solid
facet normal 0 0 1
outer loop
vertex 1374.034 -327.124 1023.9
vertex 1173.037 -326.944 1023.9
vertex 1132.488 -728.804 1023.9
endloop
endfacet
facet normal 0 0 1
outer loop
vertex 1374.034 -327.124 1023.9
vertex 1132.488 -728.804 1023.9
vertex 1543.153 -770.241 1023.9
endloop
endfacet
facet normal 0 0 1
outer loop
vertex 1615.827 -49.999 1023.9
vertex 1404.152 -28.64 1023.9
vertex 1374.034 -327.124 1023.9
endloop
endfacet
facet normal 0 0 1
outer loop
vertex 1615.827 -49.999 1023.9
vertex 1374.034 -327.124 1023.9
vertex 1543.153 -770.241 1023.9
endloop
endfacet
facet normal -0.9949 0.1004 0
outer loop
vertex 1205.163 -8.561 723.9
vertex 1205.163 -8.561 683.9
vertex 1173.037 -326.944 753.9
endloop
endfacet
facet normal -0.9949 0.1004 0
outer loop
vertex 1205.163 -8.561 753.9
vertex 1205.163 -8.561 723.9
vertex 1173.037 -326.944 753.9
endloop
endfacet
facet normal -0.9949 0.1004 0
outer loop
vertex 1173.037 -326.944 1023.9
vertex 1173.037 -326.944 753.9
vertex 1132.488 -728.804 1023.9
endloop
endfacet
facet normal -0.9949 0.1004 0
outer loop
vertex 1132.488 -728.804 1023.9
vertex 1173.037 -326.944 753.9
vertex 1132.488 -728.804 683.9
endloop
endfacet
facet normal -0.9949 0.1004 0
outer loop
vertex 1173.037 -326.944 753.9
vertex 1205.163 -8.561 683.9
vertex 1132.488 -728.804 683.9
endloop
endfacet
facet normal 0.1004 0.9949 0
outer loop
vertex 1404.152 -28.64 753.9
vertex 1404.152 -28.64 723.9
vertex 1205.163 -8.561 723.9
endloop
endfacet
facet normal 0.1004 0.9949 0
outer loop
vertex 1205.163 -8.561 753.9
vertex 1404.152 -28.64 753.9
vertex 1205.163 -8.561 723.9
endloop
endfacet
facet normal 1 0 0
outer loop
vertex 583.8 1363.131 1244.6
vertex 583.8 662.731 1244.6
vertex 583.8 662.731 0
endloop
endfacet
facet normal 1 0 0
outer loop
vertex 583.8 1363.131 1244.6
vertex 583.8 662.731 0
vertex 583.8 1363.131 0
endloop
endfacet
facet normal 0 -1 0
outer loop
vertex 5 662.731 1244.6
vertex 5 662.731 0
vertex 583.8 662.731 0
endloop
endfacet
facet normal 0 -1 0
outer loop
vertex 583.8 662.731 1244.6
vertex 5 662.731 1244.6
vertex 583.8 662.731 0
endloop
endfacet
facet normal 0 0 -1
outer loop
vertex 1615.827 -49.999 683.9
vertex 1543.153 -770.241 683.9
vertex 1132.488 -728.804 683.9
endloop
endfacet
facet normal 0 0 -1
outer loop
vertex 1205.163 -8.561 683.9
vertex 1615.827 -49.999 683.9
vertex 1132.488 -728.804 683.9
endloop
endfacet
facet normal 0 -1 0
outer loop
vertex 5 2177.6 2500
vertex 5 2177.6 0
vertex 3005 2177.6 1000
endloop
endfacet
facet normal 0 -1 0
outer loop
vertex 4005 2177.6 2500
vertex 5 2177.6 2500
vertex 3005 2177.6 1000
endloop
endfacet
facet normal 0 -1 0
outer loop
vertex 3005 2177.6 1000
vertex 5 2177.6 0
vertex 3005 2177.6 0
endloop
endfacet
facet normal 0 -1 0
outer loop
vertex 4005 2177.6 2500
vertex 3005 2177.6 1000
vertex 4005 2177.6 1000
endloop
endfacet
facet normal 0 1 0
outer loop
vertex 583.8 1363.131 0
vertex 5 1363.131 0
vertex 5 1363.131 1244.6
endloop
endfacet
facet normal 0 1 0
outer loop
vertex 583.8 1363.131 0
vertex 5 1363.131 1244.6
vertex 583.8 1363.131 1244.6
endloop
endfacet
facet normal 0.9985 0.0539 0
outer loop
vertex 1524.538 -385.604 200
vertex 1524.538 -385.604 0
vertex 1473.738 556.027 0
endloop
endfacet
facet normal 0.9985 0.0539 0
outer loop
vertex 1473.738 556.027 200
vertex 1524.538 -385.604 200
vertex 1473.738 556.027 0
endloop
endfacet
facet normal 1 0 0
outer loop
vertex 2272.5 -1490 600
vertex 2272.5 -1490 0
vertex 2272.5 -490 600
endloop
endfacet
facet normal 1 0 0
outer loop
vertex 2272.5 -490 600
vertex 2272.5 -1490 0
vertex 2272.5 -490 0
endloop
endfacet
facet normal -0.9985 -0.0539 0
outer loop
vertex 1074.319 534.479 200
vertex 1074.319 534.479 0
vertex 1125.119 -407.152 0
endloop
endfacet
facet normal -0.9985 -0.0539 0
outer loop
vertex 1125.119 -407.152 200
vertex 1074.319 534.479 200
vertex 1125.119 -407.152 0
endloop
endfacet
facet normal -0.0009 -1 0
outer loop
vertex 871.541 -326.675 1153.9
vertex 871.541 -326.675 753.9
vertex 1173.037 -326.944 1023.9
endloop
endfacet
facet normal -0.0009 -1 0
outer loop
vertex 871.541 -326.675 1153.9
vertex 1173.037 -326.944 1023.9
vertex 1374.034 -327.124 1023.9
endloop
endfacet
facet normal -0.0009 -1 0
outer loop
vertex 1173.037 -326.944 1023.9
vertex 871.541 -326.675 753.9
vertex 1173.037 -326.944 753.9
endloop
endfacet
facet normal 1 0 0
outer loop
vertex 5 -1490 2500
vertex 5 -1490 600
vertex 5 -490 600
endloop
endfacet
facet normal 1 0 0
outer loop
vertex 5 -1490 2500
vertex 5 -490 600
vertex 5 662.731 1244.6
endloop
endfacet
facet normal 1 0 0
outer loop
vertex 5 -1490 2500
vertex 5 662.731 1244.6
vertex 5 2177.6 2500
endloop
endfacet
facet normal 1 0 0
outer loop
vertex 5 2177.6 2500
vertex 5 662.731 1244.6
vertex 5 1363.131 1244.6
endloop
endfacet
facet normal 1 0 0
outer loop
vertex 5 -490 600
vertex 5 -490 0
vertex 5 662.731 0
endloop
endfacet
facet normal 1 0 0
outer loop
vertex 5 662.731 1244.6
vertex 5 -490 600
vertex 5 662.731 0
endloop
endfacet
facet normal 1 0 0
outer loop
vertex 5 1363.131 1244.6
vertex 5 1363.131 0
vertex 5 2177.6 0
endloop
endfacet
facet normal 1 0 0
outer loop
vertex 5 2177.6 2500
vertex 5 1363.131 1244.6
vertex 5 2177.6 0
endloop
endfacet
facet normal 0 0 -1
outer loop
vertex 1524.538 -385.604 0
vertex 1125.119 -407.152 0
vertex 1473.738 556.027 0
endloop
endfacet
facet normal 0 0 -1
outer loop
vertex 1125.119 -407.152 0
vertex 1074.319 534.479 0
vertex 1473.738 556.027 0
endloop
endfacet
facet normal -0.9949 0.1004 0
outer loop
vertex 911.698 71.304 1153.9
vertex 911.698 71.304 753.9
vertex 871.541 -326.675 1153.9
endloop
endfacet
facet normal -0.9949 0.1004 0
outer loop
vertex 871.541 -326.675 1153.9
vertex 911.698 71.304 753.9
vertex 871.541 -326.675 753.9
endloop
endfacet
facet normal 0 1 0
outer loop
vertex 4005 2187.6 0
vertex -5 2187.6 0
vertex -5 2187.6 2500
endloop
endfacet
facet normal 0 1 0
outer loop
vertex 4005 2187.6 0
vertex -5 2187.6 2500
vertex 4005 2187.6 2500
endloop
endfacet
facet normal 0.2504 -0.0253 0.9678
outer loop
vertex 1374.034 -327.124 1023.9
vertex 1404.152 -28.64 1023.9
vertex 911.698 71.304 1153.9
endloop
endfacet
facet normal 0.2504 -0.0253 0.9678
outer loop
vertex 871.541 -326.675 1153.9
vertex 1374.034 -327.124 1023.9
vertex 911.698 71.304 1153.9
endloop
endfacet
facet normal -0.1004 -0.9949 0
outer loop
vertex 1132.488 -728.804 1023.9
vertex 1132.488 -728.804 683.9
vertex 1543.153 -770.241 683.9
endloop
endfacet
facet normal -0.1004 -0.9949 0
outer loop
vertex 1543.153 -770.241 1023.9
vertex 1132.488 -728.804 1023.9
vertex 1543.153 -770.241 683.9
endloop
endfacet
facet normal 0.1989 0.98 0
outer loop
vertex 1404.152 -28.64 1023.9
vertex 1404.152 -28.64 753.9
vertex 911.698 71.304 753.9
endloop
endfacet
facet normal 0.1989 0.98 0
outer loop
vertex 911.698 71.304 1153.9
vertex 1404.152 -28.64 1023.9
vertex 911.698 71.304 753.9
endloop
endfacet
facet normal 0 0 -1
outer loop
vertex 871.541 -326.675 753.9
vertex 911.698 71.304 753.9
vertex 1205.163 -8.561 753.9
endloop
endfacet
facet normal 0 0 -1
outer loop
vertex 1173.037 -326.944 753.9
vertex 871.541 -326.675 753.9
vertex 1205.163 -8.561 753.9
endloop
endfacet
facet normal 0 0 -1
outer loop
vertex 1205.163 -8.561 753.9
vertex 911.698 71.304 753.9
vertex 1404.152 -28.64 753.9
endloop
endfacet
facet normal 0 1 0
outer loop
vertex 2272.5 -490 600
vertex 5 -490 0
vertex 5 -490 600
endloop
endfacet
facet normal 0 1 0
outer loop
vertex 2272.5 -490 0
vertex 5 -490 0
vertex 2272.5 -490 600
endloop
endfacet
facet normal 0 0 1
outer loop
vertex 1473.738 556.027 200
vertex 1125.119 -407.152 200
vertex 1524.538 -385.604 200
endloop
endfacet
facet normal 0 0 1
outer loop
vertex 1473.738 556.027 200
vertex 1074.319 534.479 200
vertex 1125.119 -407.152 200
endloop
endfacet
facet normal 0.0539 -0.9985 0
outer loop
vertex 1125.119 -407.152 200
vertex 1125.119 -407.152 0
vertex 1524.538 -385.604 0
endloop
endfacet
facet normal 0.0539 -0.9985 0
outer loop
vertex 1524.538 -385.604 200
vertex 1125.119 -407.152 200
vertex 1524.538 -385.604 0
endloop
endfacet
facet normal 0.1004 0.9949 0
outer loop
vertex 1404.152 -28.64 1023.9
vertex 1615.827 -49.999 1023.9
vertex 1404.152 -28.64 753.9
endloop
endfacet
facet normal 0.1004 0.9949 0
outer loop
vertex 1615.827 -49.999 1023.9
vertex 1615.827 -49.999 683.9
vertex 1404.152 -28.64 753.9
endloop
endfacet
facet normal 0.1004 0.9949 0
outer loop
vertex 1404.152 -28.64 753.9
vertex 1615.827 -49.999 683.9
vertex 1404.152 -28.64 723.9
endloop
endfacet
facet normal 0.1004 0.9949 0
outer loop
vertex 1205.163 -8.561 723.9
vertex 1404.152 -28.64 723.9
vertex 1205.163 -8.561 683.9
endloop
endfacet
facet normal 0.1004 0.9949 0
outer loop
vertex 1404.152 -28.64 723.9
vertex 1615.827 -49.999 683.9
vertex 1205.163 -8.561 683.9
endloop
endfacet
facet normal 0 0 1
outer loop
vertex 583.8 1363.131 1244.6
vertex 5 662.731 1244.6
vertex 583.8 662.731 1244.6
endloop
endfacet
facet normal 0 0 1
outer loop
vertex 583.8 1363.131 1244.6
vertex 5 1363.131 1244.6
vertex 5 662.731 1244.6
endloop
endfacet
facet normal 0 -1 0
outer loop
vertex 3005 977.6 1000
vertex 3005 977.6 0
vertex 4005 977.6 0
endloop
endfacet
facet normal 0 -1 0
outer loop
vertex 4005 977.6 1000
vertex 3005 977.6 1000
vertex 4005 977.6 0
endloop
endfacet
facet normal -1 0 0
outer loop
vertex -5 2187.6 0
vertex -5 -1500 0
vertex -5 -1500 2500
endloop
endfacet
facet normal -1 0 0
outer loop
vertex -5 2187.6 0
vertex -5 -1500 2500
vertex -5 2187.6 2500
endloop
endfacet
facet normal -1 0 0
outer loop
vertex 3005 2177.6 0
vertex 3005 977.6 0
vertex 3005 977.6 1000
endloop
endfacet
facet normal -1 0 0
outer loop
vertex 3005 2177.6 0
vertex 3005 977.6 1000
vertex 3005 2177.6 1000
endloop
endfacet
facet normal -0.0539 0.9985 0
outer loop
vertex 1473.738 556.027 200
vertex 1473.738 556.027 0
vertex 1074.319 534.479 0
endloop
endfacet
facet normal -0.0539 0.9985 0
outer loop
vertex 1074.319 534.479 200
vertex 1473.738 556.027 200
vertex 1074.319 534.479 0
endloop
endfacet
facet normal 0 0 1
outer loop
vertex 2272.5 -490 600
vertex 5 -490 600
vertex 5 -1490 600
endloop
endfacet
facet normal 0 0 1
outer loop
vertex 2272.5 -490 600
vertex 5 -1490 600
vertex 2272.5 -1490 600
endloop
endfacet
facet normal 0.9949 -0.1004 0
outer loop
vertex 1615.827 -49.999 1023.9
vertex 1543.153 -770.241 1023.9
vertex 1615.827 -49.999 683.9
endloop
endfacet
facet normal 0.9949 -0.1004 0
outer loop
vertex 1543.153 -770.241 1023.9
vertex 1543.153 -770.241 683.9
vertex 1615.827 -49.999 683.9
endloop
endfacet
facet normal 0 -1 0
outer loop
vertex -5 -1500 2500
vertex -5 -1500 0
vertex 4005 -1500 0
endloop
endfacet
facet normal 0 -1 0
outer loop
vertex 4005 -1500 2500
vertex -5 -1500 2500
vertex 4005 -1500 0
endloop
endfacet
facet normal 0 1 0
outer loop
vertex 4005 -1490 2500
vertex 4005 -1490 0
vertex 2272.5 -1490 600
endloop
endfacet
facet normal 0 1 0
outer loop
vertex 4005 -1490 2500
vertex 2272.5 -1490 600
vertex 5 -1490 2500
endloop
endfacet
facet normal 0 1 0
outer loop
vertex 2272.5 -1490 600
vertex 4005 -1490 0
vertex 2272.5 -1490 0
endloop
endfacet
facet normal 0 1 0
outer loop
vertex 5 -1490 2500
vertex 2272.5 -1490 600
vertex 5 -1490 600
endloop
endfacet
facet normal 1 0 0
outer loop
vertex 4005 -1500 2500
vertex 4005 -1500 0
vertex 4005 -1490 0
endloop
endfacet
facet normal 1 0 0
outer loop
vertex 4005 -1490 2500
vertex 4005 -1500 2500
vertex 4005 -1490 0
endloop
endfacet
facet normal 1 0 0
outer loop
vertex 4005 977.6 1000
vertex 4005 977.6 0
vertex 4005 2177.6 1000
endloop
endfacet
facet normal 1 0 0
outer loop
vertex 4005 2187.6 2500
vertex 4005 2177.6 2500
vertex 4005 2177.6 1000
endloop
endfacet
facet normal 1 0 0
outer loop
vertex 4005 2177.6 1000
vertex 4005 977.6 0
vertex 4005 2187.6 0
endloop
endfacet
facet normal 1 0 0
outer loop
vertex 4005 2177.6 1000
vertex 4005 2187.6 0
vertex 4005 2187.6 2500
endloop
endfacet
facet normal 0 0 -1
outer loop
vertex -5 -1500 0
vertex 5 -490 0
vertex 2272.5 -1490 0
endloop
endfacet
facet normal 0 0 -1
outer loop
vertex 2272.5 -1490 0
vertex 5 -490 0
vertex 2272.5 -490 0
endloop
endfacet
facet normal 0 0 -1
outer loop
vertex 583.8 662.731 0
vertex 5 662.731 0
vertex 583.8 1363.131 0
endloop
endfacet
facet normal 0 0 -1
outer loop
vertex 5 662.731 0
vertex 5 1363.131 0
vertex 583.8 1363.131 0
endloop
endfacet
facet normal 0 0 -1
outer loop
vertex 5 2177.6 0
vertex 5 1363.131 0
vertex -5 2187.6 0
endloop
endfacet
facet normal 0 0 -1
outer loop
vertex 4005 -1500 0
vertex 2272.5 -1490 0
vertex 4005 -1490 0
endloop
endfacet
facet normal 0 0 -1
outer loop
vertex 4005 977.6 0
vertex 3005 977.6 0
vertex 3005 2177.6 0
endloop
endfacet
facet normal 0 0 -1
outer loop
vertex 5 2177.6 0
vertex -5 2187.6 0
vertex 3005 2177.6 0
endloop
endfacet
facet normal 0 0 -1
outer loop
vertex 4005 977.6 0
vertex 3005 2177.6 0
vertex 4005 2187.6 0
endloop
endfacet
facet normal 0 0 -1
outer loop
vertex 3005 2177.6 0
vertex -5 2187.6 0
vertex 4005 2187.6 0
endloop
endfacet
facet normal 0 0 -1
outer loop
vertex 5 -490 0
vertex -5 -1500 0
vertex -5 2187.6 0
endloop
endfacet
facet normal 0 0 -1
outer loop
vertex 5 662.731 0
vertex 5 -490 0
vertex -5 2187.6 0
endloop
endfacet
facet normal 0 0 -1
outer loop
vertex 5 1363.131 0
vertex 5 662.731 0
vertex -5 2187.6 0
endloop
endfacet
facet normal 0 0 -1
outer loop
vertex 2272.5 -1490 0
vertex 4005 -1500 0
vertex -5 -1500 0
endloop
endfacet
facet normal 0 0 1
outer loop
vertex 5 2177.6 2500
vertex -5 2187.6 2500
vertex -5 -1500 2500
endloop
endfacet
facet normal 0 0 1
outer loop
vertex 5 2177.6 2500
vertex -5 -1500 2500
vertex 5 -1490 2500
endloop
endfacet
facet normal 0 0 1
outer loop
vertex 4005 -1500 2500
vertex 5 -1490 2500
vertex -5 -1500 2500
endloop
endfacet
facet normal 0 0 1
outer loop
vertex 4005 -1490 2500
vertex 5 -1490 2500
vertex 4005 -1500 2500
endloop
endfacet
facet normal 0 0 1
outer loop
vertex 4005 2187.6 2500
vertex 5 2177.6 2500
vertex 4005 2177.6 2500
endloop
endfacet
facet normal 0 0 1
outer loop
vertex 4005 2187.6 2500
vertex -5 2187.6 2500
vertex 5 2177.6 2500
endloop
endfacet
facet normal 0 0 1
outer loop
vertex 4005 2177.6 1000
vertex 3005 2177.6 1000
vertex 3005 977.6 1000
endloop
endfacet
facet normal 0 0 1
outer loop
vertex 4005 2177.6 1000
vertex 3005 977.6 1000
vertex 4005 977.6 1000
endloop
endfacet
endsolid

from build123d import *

# Parameters (mm, degrees)
SKETCH1_W            = 10
SKETCH1_H            = 3687.6
BOSS_EXTRUDE1_DEPTH  = 2500
BOSS_EXTRUDE2_DEPTH  = 2500
SKETCH3_3_W          = 2267.5
SKETCH3_3_H          = 1000
BOSS_EXTRUDE3_DEPTH  = 600
SKETCH3_4_W          = 558.8
SKETCH3_4_H          = 660.4
SKETCH3_4_W_2        = 578.8
SKETCH3_4_H_2        = 700.4
BOSS_EXTRUDE4_DEPTH  = 1244.6
BOSS_EXTRUDE5_DEPTH  = 200
SKETCH3_7_W          = 4000
SKETCH3_7_H          = 10
BOSS_EXTRUDE7_DEPTH  = 2500
SKETCH3_8_W          = 1000
SKETCH3_8_H          = 1200
BOSS_EXTRUDE8_DEPTH  = 1000
BOSS_EXTRUDE9_START  = 723.9
BOSS_EXTRUDE9_DEPTH  = 40
BOSS_EXTRUDE11_START = 723.9
BOSS_EXTRUDE11_DEPTH = 30
BOSS_EXTRUDE13_START = 723.9
BOSS_EXTRUDE13_DEPTH = 300
LOFT1_START          = 753.9
LOFT1_DEPTH          = 400
LOFT1_START_2        = 1343.22413698
LOFT1_2_DEPTH        = 126.77586302


with BuildPart() as part:
    # Sketch1 → Boss-Extrude1 (new body)
    with BuildSketch(Plane.XY):
        with Locations((0, 343.8)):
            Rectangle(SKETCH1_W, SKETCH1_H)
    extrude(amount=BOSS_EXTRUDE1_DEPTH)

    # Sketch3 → Boss-Extrude2 (add)
    with BuildSketch(Plane.XY):
        Polygon((3072.5, -1490), (2272.5, -1490), (5, -1490), (5, -1500), (4005, -1500), (4005, -1490), align=None)
    extrude(amount=BOSS_EXTRUDE2_DEPTH)

    # Sketch3<3> → Boss-Extrude3 (add)
    with BuildSketch(Plane.XY):
        with Locations((1138.75, -990)):
            Rectangle(SKETCH3_3_W, SKETCH3_3_H)
    extrude(amount=BOSS_EXTRUDE3_DEPTH)

    # Sketch3<4> → Boss-Extrude4 (add)
    with BuildSketch(Plane.XY):
        with Locations((284.4, 1012.930691938)):
            Rectangle(SKETCH3_4_W, SKETCH3_4_H)
        with Locations((294.4, 1012.930691938)):
            Rectangle(SKETCH3_4_W_2, SKETCH3_4_H_2)
    extrude(amount=BOSS_EXTRUDE4_DEPTH)

    # Sketch3<7> → Boss-Extrude7 (add)
    with BuildSketch(Plane.XY):
        with Locations((2005, 2182.6)):
            Rectangle(SKETCH3_7_W, SKETCH3_7_H)
    extrude(amount=BOSS_EXTRUDE7_DEPTH)

    # Sketch3<8> → Boss-Extrude8 (add)
    with BuildSketch(Plane.XY):
        with Locations((3505, 1577.6)):
            Rectangle(SKETCH3_8_W, SKETCH3_8_H)
    extrude(amount=BOSS_EXTRUDE8_DEPTH)


with BuildPart() as body_2:
    # Sketch3<5> → Boss-Extrude5 (new body)
    with BuildSketch(Plane.XY):
        Polygon((1125.118882054, -407.151961824), (1524.538051487, -385.603711559), (1473.738051487, 556.026980379), (1074.318882054, 534.478730114), align=None)
    extrude(amount=BOSS_EXTRUDE5_DEPTH)


with BuildPart() as body_3:
    # Sketch3<9> → Boss-Extrude9 (new body)
    with BuildSketch(Plane.XY.offset(BOSS_EXTRUDE9_START)):
        Polygon((1132.487942059, -728.803884792), (1205.162776182, -8.561162867), (1615.827486051, -49.998568288), (1543.152651928, -770.241290213), align=None)
    extrude(amount=-BOSS_EXTRUDE9_DEPTH)



with BuildPart() as body_4:
    # Sketch3<10> → Boss-Extrude11 (new body)
    with BuildSketch(Plane.XY.offset(BOSS_EXTRUDE11_START)):
        Polygon((1205.162776182, -8.561162867), (1175.044734689, -307.045506806), (1374.034297315, -327.124201135), (1404.152338808, -28.639857196), align=None)
    extrude(amount=BOSS_EXTRUDE11_DEPTH)


with BuildPart() as body_3_1:
    add(body_3.part)

    add(body_4.part)  # Boss-Extrude13 merges body 4
    # Sketch3<11> → Boss-Extrude13 (add)
    with BuildSketch(Plane.XY.offset(BOSS_EXTRUDE13_START)):
        Polygon((1132.487942059, -728.803884792), (1543.152651928, -770.241290213), (1615.827486051, -49.998568288), (1404.152338808, -28.639857196), (1374.034297315, -327.124201135), (1175.044734689, -307.045506806), align=None)
    extrude(amount=BOSS_EXTRUDE13_DEPTH)

    # Loft1: read off the stored shape, not the designer's step
    # Loft1 outline → Loft1 (add)
    with BuildSketch(Plane.XY.offset(LOFT1_START)):
        Polygon((911.698105825, 71.304269282), (871.540717168, -326.67485597), (1374.034297315, -327.124201135), (1404.152338808, -28.639857196), align=None)
    extrude(amount=LOFT1_DEPTH)

    # Loft1 2 outline → Loft1 2 (cut)
    with BuildSketch(Plane(origin=(0, 0, 0), x_dir=(0.9681521540004261, 0.006532813937532859, -0.25027730429743866), z_dir=(0.25036255052290696, -0.025262395961762493, 0.9678225067882728)).offset(LOFT1_START_2)):
        with BuildLine():
            add(Edge.make_bspline(
                [(594.333321048, 101.389182409), (763.884574243, 66.955102294), (933.435827438, 32.52102218), (1102.987080633, -1.913057935)],
                knots=[0, 0, 0, 0, 1, 1, 1, 1], degree=3))
            Line((594.333321048, 101.389182409), (552.854935144, -296.454434484))
            add(Edge.make_bspline(
                [(552.854935144, -296.454434484), (725.862720498, -297.734879858), (898.870505851, -299.015325231), (1071.878291205, -300.295770605)],
                knots=[0, 0, 0, 0, 1, 1, 1, 1], degree=3))
            Line((1071.878291205, -300.295770605), (1102.987080633, -1.913057935))
        make_face()
    extrude(amount=LOFT1_2_DEPTH, mode=Mode.SUBTRACT)


solid = Compound([part.part, body_2.part, body_3_1.part])
